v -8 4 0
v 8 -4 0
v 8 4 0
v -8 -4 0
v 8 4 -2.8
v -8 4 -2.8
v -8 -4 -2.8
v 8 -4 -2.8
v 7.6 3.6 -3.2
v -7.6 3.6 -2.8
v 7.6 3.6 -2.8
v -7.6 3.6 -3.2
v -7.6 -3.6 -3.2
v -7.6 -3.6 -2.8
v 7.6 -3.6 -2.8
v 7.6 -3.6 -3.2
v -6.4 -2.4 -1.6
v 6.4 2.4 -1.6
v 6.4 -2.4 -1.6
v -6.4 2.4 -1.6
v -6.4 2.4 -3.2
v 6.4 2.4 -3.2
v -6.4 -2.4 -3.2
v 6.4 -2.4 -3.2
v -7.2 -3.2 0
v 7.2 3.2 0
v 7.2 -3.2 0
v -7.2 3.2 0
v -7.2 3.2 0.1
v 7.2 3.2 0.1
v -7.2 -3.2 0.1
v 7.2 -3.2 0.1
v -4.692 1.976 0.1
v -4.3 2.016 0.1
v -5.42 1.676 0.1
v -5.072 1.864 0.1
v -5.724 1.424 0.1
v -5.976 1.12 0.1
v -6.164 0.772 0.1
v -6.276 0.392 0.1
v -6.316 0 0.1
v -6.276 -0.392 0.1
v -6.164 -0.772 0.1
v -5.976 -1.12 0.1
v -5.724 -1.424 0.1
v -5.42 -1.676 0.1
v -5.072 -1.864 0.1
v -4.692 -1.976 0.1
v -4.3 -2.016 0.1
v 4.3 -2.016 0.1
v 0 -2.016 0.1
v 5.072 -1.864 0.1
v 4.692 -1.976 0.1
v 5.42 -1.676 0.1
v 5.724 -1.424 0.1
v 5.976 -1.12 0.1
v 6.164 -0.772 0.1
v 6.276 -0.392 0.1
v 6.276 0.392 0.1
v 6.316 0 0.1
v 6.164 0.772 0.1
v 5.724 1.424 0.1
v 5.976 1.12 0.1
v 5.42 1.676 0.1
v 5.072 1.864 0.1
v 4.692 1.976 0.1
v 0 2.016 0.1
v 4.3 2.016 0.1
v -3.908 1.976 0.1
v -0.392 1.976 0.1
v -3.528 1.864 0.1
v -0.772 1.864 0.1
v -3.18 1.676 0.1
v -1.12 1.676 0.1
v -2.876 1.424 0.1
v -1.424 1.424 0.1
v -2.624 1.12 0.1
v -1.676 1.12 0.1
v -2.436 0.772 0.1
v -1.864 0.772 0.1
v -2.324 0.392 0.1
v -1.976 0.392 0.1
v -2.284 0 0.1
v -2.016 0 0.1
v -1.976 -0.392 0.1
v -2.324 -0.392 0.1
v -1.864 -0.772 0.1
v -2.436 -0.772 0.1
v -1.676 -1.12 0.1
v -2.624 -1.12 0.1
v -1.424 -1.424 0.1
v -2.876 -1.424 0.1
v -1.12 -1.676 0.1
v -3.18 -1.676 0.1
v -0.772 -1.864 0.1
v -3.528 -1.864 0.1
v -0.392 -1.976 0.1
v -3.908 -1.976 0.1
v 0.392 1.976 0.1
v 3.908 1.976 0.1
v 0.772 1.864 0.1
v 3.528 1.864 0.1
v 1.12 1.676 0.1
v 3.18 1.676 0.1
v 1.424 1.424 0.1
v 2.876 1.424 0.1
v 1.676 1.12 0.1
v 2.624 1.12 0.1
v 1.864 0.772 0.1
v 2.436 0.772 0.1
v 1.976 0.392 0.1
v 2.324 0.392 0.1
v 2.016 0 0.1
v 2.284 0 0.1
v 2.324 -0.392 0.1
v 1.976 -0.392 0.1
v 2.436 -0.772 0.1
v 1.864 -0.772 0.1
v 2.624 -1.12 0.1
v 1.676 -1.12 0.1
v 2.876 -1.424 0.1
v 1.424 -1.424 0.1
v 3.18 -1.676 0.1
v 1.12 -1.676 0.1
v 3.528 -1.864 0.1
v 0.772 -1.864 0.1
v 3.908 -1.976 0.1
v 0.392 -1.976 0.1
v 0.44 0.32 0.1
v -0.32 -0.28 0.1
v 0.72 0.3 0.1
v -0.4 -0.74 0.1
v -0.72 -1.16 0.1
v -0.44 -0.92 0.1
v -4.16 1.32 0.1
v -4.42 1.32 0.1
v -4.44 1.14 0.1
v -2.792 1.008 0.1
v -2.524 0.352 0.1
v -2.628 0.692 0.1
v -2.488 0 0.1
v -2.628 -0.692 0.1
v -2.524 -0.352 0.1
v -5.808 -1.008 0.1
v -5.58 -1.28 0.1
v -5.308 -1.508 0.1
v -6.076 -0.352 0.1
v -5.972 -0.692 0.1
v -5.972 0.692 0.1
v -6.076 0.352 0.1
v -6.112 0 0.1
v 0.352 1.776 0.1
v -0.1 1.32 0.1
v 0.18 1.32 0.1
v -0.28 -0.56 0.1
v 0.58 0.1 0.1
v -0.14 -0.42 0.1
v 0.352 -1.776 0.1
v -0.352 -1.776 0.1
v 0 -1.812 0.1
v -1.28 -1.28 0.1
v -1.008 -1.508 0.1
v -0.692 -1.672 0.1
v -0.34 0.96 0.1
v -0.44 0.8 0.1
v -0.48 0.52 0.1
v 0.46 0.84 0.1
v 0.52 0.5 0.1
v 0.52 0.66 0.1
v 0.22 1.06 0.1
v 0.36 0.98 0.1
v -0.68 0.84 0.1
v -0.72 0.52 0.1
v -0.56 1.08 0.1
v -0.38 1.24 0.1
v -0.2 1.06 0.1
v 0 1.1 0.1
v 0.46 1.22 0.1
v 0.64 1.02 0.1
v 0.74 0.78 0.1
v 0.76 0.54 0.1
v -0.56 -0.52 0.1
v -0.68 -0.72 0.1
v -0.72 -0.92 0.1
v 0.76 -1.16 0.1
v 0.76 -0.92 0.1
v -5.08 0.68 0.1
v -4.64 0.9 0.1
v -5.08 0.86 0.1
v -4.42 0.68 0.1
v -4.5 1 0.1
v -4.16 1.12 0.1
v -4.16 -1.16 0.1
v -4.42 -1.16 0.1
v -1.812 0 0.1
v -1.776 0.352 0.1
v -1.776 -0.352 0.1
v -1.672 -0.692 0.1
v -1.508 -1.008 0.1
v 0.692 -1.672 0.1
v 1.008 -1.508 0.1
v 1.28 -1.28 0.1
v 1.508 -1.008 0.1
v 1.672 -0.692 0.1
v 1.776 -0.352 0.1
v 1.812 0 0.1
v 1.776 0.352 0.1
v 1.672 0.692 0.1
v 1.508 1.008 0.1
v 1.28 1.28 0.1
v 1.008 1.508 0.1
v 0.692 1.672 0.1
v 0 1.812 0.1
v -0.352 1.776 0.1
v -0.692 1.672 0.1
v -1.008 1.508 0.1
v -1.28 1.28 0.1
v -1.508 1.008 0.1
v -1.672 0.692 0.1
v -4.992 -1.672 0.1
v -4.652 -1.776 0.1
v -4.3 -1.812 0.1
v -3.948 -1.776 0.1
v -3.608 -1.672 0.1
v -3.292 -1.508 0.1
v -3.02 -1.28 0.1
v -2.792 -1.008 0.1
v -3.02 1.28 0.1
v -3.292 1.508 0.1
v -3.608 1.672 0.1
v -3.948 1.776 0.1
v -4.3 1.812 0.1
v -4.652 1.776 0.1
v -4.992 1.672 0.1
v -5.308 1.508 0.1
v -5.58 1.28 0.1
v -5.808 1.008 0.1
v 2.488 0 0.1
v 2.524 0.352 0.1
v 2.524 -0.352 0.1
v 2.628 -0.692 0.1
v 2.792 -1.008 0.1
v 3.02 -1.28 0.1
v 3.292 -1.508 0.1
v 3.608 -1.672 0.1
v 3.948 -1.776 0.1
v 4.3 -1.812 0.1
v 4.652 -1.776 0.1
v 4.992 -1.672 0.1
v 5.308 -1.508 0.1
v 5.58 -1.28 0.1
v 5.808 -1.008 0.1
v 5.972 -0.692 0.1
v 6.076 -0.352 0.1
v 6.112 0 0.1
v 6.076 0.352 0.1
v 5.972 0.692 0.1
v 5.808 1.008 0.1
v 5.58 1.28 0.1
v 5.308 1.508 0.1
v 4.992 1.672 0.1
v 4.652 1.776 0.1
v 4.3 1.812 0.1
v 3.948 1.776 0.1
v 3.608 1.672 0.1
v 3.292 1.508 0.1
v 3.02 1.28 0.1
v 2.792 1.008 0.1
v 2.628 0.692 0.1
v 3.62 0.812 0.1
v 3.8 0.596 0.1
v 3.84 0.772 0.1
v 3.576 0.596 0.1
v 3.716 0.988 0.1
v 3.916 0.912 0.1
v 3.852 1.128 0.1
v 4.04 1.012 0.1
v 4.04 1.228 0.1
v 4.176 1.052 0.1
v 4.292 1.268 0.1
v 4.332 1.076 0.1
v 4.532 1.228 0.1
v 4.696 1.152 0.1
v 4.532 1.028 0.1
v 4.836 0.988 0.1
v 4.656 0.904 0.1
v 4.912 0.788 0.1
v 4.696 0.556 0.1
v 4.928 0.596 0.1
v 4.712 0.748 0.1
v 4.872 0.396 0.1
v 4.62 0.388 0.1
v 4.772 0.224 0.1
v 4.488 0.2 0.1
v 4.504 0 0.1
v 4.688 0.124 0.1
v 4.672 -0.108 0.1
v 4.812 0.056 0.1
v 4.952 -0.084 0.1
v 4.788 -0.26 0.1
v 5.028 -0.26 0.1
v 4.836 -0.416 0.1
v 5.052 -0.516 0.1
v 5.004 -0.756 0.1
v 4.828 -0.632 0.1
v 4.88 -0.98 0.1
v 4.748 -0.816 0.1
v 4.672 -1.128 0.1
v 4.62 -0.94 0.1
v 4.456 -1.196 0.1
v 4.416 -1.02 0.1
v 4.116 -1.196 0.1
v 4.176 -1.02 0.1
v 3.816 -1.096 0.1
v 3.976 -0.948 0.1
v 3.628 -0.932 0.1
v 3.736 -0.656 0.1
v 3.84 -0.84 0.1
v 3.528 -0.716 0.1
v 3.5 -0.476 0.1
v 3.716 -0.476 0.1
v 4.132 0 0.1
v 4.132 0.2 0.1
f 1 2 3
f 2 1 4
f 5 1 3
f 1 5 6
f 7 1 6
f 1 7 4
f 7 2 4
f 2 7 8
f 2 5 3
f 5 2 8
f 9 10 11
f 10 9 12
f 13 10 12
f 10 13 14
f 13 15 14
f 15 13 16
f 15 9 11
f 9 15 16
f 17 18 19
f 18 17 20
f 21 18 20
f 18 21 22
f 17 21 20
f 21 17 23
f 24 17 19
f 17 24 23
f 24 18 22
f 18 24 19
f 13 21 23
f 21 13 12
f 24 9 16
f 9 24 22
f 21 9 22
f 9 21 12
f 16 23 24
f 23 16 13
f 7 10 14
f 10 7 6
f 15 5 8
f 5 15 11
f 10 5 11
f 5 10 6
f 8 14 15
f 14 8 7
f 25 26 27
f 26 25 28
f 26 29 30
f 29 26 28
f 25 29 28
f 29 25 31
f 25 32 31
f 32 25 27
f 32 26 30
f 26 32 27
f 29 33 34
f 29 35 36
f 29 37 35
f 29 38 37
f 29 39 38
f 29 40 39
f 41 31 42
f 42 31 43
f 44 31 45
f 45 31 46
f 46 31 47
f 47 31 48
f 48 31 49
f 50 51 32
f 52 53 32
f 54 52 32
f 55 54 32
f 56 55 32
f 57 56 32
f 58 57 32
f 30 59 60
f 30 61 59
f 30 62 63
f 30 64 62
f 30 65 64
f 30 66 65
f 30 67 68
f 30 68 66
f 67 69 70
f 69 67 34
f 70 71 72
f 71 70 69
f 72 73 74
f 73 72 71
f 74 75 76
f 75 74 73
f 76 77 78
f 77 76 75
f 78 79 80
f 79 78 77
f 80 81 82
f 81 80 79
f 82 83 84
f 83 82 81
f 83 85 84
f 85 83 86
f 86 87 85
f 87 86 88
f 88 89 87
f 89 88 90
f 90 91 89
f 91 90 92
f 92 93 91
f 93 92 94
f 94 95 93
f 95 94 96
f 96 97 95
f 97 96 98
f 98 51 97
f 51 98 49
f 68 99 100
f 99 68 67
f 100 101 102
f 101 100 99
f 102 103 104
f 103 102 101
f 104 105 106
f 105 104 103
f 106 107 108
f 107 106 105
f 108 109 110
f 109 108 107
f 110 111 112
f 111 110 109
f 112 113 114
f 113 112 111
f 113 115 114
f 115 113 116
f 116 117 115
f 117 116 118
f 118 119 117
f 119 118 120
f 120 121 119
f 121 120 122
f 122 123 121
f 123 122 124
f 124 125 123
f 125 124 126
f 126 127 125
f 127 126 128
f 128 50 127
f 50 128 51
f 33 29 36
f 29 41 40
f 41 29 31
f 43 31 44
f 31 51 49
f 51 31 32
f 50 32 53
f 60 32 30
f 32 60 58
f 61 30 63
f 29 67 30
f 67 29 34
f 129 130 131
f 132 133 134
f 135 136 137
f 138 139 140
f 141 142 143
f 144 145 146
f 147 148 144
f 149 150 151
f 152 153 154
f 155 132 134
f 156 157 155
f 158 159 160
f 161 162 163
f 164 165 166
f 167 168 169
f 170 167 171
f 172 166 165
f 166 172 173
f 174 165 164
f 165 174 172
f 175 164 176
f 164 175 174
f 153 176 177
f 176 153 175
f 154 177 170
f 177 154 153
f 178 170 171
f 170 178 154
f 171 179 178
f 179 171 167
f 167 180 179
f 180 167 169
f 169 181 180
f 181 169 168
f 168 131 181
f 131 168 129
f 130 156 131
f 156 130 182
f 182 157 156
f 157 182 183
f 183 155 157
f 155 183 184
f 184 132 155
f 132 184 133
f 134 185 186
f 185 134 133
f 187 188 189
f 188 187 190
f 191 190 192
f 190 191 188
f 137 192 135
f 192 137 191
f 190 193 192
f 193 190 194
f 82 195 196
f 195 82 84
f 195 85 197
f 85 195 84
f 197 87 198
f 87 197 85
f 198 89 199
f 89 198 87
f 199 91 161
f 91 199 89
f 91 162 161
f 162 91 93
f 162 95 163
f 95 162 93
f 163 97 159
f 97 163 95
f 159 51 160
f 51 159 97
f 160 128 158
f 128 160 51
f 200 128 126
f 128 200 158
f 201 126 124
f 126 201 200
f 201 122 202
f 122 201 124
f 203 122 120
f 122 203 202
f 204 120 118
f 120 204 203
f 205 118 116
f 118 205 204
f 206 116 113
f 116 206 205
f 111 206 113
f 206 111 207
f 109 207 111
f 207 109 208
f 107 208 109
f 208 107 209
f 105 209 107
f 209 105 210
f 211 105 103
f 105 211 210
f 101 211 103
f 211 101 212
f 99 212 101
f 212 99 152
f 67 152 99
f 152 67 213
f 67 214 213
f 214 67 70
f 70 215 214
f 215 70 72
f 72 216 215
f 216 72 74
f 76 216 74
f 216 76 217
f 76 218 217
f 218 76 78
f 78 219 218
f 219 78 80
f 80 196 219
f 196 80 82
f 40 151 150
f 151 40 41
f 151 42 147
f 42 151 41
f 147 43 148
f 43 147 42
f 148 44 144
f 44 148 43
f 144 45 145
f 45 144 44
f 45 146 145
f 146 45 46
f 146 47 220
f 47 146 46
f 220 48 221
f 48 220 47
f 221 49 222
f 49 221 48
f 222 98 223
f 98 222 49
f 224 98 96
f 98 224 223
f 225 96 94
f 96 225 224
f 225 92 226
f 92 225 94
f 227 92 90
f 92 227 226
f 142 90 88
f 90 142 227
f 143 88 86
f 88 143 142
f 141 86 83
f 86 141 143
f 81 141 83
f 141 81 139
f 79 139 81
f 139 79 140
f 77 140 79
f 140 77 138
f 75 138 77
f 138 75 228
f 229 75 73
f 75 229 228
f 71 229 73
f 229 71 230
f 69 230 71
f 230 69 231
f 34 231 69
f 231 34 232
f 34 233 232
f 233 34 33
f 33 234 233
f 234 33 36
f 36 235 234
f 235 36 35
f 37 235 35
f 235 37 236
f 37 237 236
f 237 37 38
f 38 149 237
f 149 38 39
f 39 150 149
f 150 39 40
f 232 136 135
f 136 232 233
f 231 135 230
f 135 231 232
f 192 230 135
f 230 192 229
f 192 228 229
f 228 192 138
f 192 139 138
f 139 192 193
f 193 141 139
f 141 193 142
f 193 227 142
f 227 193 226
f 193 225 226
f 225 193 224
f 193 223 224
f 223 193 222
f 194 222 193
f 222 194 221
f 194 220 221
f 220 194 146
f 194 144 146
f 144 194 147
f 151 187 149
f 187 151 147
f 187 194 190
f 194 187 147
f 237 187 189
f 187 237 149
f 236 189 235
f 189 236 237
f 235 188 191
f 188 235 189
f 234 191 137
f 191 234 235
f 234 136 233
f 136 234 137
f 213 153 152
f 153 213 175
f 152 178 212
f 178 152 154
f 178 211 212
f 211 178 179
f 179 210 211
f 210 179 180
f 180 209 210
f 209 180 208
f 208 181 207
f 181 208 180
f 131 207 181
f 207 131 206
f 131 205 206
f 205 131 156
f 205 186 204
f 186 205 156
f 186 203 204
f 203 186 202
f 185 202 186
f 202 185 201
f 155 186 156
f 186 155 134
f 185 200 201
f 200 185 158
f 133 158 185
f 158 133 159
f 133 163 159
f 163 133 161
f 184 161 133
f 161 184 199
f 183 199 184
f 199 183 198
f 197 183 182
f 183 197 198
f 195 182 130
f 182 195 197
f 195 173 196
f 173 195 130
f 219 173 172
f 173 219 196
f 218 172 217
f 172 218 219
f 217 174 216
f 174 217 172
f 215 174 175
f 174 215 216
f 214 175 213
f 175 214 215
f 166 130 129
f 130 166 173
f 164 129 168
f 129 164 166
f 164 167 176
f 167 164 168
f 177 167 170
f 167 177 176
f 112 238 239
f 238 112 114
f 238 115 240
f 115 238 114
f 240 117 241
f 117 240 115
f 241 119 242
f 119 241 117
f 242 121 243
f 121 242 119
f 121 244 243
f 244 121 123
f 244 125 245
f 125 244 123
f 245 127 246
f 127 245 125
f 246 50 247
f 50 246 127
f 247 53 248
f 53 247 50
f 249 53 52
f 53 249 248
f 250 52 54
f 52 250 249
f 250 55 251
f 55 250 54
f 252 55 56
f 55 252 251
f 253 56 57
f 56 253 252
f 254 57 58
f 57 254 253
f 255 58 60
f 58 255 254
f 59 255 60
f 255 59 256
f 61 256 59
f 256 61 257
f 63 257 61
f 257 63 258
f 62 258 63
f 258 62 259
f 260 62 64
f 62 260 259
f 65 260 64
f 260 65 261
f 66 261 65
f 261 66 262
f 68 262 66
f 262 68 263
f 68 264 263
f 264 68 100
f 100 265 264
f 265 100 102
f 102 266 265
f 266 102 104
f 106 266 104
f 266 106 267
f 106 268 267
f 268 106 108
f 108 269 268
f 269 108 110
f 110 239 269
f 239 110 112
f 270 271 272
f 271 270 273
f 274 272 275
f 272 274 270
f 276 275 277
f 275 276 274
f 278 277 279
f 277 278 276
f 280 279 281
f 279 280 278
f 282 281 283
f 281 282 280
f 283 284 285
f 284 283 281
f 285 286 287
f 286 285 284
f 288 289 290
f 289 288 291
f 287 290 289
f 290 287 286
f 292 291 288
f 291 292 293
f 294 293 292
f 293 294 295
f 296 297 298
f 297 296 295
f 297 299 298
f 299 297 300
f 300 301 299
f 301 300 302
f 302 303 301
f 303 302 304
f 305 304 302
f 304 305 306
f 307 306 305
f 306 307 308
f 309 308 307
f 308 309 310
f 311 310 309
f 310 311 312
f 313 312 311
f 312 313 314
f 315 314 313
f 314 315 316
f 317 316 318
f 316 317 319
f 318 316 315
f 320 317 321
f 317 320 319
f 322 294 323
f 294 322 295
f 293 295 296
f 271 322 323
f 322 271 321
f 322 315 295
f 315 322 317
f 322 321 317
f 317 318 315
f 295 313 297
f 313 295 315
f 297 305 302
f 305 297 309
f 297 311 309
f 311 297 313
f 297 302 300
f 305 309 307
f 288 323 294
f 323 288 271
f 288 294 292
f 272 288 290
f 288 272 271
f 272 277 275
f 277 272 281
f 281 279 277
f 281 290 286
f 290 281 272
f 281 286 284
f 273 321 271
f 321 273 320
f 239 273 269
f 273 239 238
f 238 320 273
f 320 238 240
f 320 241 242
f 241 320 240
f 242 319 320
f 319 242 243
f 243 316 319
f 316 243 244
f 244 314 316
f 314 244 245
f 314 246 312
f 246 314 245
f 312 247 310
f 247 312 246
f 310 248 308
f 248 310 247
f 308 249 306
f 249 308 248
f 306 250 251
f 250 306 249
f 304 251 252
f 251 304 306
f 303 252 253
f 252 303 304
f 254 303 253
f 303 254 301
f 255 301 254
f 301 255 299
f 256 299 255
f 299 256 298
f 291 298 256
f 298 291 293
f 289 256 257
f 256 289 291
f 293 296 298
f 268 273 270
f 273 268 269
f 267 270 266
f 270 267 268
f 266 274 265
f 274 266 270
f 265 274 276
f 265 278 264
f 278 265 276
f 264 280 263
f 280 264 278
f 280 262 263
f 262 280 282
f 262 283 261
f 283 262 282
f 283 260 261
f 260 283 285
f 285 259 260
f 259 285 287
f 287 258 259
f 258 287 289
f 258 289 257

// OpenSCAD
use <../lib.scad>
use <3069b.scad>
use <821577d.scad>
function ldraw_lib__3069bd1t() = [
// 0 Tile  1 x  2 with "1", "2" and "3" in Yellow Circle Sticker
// 0 Name: 3069bd1t.dat
// 0 Author: Evert-Jan Boer [ejboer]
// 0 !LDRAW_ORG Shortcut UPDATE 2026-07
// 0 !LICENSE Licensed under CC BY 4.0 : see CAreadme.txt
// 
// 0 BFC CERTIFY CCW
  [0,"BFC","CERTIFY"],
  [0,"BFC","CCW"],
// 
// 0 !CATEGORY Sticker Shortcut
// 0 !KEYWORDS Bricklink 3069pb0062, Set 8082
// 
// 0 !HISTORY 2026-07-30 [OrionP] Official Update 2026-07
// 
// 1 16 0 0 0 1 0 0 0 1 0 0 0 1 3069b.dat
  [1,16,0,0,0,1,0,0,0,1,0,0,0,1, ldraw_lib__3069b()],
// 1 16 0 0 0 1 0 0 0 1 0 0 0 1 821577d.dat
  [1,16,0,0,0,1,0,0,0,1,0,0,0,1, ldraw_lib__821577d()],
];
module ldraw_lib__3069bd1t(step=0, col=false, unit=2/5, alt=false, line=0.2, solid=!$preview)
    makepoly(ldraw_lib__3069bd1t(), step=step, col=col, unit=unit, alt=alt, line=line, solid=solid);
ldraw_lib__3069bd1t(line=0.2);
